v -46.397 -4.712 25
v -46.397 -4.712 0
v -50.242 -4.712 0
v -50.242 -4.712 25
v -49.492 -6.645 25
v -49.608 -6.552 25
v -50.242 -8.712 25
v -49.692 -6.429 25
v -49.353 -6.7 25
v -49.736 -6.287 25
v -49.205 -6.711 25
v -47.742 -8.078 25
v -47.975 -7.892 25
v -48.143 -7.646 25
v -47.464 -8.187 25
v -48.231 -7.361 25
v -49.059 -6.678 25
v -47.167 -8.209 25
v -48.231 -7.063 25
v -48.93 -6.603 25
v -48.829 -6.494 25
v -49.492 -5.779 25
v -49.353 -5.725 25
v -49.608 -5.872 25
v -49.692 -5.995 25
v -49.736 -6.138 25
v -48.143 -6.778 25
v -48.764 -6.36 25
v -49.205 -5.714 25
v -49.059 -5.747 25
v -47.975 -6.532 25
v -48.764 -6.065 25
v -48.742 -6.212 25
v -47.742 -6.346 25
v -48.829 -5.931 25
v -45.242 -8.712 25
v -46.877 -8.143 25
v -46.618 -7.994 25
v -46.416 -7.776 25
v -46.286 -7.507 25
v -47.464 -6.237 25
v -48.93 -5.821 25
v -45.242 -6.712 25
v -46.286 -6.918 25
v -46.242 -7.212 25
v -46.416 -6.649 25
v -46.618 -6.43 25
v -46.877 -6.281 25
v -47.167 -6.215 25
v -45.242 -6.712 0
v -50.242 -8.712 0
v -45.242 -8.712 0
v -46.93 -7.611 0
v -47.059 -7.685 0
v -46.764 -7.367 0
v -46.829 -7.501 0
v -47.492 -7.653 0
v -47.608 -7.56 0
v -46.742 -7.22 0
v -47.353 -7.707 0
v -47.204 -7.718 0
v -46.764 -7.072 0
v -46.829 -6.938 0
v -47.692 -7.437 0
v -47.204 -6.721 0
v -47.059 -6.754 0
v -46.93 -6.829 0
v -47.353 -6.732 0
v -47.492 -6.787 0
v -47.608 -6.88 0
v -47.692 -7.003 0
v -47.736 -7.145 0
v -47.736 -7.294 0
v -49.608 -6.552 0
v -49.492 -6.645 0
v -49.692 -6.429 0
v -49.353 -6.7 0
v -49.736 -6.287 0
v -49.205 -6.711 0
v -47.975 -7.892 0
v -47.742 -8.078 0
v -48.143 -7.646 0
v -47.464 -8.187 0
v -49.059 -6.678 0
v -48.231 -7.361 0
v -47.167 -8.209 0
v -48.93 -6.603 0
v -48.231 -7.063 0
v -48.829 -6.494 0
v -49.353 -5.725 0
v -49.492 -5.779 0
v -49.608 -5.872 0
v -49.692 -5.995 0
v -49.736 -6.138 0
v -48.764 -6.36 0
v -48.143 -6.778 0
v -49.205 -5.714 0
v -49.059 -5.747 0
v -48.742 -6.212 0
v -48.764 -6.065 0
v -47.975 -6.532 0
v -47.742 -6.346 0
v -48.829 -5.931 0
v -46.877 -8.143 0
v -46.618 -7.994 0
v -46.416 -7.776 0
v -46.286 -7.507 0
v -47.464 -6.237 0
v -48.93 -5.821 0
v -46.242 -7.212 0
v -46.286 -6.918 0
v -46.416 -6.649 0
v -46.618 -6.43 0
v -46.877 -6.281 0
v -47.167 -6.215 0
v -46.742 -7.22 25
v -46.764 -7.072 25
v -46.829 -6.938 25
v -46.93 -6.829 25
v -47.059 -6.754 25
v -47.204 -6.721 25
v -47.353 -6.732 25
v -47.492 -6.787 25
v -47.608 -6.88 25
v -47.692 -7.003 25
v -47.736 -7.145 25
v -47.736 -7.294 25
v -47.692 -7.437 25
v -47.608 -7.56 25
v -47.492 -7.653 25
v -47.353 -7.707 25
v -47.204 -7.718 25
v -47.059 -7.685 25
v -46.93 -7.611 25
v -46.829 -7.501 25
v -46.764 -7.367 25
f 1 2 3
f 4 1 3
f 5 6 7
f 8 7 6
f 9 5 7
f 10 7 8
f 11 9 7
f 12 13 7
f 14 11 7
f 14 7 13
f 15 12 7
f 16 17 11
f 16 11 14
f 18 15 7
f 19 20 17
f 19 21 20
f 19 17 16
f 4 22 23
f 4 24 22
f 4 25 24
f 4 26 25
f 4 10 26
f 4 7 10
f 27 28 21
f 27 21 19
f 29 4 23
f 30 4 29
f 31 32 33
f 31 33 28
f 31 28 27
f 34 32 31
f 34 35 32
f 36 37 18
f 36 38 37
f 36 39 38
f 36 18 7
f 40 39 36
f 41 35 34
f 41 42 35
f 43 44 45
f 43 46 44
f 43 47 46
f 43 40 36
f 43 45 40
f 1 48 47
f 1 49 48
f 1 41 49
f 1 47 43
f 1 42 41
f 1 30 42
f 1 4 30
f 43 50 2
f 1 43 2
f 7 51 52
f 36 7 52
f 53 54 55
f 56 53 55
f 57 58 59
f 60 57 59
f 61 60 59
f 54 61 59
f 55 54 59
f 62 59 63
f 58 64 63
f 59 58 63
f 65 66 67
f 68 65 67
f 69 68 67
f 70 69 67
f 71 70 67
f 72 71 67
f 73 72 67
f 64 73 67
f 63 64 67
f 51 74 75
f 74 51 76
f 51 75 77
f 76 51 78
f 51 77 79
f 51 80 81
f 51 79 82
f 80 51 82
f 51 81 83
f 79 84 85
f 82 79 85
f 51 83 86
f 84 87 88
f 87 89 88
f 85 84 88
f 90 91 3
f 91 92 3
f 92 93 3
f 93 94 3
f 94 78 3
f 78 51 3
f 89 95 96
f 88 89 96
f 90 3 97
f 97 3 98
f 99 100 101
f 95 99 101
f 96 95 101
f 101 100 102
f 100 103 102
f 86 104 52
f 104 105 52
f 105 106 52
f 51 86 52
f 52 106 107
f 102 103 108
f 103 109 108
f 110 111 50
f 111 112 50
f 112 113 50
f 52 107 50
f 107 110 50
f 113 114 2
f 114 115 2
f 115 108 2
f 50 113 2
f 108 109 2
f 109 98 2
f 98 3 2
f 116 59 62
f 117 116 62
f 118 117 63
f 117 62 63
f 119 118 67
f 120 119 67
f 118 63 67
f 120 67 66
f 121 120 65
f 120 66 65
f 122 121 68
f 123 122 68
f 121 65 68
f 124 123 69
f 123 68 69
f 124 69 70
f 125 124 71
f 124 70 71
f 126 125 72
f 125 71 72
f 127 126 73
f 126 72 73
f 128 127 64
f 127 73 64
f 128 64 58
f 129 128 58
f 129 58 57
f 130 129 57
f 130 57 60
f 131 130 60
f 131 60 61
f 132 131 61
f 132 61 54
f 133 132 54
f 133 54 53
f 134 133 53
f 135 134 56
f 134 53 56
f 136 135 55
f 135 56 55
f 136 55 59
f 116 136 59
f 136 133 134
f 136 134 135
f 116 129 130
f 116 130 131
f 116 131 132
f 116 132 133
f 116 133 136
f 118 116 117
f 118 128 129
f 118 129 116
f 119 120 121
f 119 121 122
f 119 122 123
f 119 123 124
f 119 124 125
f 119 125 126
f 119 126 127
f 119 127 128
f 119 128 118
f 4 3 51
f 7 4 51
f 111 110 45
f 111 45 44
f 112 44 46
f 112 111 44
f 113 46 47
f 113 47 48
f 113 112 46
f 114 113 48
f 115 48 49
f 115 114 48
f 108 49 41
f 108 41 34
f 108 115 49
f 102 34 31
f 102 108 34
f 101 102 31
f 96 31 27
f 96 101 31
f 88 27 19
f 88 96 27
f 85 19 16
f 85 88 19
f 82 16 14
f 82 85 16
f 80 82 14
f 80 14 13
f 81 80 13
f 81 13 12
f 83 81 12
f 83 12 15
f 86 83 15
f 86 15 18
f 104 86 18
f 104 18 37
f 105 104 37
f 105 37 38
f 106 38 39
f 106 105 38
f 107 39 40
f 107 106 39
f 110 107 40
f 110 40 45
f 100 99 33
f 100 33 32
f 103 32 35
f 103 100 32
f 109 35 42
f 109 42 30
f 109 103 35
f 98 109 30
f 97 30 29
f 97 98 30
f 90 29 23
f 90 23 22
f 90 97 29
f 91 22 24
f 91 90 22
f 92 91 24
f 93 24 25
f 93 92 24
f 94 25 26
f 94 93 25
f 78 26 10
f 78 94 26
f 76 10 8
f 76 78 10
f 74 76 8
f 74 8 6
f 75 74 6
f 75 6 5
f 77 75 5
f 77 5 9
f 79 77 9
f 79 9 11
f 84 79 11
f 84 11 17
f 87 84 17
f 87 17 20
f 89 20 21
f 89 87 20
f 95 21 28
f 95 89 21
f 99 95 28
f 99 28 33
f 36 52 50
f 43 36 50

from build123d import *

# Parameters (mm, degrees)
F0_R     = 1
F0_R_2   = 0.5
F2_DEPTH = 25
F1_R     = 0.5
F3_DEPTH = 25


with BuildPart() as f2:
    # F0 (on Top) → F2 (new body)
    with BuildSketch(Plane.XY):
        Polygon((-50.241936, -6.212296), (-50.241936, -8.712296), (-47.241936, -8.712296), (-45.241936, -8.712296), (-45.241936, -6.712296), (-46.396637, -4.712296), (-50.241936, -4.712296), align=None)
        with Locations((-47.241936, -7.212296)):
            Circle(F0_R, mode=Mode.SUBTRACT)
        with Locations((-49.241936, -6.212296)):
            Circle(F0_R_2, mode=Mode.SUBTRACT)
    extrude(amount=F2_DEPTH)


with BuildPart() as f3:
    # F1 (on Top) → F3 (new body)
    with BuildSketch(Plane.XY):
        with Locations((-47.241829, -7.219651)):
            Circle(F1_R)
    extrude(amount=F3_DEPTH)


solid = Compound([f2.part, f3.part])
